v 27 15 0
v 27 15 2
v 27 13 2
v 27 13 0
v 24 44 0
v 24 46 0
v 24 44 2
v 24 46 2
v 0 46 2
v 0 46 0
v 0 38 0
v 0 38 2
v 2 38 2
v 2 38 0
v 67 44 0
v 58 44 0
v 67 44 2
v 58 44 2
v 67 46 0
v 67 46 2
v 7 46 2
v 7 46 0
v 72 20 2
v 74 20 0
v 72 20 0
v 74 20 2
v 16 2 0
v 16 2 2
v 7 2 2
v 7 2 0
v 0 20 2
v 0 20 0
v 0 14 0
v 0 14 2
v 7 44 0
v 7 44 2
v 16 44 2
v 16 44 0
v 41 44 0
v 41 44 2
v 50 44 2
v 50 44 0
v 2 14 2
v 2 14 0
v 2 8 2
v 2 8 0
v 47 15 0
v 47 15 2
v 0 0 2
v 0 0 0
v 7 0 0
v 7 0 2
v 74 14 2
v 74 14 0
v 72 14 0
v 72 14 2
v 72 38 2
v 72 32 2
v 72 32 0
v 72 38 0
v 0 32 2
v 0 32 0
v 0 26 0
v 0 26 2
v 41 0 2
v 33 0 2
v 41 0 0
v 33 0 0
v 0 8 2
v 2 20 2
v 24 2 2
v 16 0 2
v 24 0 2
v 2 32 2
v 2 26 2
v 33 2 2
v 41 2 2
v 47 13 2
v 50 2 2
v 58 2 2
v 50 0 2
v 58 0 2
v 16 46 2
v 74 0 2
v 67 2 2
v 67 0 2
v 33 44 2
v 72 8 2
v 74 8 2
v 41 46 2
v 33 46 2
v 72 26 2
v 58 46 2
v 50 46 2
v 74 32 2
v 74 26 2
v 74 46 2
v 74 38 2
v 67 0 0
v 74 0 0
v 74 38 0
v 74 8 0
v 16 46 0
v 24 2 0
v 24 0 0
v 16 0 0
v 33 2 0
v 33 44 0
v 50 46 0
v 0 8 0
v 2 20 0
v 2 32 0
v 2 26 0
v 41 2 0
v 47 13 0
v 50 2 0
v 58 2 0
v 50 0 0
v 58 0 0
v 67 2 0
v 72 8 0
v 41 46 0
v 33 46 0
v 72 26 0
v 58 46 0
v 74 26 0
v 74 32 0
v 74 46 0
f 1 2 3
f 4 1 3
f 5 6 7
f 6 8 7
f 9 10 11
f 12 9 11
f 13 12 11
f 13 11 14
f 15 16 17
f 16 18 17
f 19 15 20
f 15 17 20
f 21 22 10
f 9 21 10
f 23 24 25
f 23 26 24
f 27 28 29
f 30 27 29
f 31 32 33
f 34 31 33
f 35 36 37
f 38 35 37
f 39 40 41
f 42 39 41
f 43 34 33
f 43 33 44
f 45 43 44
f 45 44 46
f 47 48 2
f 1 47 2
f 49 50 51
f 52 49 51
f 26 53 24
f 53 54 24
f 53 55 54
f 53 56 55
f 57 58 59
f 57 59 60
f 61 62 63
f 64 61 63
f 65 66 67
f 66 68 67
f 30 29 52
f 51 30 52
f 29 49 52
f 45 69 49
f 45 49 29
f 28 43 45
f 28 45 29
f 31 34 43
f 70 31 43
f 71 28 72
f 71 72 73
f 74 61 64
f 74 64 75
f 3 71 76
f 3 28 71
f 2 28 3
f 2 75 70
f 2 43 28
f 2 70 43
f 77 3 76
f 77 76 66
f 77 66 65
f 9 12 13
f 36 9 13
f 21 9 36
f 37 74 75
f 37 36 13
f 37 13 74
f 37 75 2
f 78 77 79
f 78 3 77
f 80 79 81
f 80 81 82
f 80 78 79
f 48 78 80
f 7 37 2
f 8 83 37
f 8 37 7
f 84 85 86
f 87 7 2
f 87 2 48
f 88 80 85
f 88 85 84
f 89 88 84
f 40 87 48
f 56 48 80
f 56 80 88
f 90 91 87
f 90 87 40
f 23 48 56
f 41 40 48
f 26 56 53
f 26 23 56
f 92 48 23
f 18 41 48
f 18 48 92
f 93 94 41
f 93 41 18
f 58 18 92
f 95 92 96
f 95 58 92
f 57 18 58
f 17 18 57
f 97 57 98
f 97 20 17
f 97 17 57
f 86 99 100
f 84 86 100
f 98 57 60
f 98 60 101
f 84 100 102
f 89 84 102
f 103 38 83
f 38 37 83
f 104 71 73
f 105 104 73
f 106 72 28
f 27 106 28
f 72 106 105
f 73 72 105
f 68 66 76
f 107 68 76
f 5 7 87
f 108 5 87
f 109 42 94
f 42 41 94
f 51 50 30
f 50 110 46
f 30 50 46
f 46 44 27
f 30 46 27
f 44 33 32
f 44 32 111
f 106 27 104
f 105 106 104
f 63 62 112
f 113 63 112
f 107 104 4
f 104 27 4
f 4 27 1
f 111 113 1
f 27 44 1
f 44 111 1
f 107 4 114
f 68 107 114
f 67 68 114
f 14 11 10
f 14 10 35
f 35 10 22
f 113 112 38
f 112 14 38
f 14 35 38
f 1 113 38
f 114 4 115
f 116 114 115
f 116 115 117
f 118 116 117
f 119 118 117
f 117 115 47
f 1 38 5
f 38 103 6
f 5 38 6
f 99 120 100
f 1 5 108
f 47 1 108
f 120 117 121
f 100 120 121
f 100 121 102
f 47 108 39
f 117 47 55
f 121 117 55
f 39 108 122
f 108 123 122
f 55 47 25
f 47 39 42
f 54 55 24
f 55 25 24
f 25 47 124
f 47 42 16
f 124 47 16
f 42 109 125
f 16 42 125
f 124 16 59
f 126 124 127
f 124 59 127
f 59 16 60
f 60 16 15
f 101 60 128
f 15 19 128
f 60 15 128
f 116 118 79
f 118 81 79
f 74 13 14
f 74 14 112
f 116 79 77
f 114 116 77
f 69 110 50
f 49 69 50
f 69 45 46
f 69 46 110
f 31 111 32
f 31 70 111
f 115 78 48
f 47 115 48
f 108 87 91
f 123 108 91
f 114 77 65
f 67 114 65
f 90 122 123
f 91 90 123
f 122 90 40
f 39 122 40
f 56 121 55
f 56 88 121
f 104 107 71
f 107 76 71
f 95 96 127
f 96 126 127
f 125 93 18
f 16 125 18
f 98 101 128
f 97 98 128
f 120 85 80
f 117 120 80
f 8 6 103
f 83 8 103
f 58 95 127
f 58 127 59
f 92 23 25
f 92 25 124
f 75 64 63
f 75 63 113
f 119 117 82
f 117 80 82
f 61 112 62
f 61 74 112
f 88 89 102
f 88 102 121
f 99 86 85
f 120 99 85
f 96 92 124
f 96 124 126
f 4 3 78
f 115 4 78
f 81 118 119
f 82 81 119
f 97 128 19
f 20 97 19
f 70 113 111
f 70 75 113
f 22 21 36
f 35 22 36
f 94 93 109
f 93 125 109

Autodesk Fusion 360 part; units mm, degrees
sketch "スケッチ1" plane through (0, 0, 0) normal (0, 0, 1) x (1, 0, 0)
  line L0 (0, 0) -> (74, 0)
  line L1 (74, 0) -> (74, 46)
  line L2 (74, 46) -> (0, 46)
  line L3 (0, 46) -> (0, 0)
  dimension "d1" = 46
  dimension "d2" = 74
extrude "押し出し1" add sketch "スケッチ1" along normal blind 2
sketch "スケッチ2" plane through (0, 0, 2) normal (0, 0, 1) x (-1, 0, 0)
  line L0 (0, -46) -> (0, 0)
  line L1 (0, 0) -> (-74, 0)
  line L2 (-74, 0) -> (-74, -46)
  line L3 (-74, -46) -> (0, -46)
  line L4 (-27, -13) -> (-47, -13)
  line L5 (-47, -13) -> (-47, -15)
  line L6 (-47, -15) -> (-27, -15)
  line L7 (-27, -15) -> (-27, -13)
  dimension "d5" = 2
  dimension "d6" = 20
  dimension "d7" = 13
  dimension "d8" = 27
extrude "押し出し2" cut sketch "スケッチ2" against normal blind 2 contours L4 L5 L6 L7
sketch "スケッチ3" plane through (0, 0, 2) normal (0, 0, 1) x (-1, 0, 0)
  line L0 (-47, -13) -> (-27, -13)
  line L1 (-27, -13) -> (-27, -15)
  line L2 (-27, -15) -> (-47, -15)
  line L3 (-47, -15) -> (-47, -13)
  line L4 (0, -46) -> (0, 0)
  line L5 (0, 0) -> (-74, 0)
  line L6 (-74, 0) -> (-74, -46)
  line L7 (-74, -46) -> (0, -46)
  line L8 (-67, -46) -> (-58, -46)
  line L9 (-58, -46) -> (-58, -44)
  line L10 (-58, -44) -> (-67, -44)
  line L11 (-67, -44) -> (-67, -46)
  line L12 (-50, -46) -> (-41, -46)
  line L13 (-50, -44) -> (-50, -46)
  line L14 (-41, -44) -> (-50, -44)
  line L15 (-41, -46) -> (-41, -44)
  line L16 (-33, -46) -> (-24, -46)
  line L17 (-33, -44) -> (-33, -46)
  line L18 (-24, -44) -> (-33, -44)
  line L19 (-24, -46) -> (-24, -44)
  line L20 (-16, -46) -> (-7, -46)
  line L21 (-16, -44) -> (-16, -46)
  line L22 (-7, -44) -> (-16, -44)
  line L23 (-7, -46) -> (-7, -44)
  line L24 (-24, 0) -> (-33, 0)
  line L25 (-33, 0) -> (-33, -2)
  line L26 (-58, 0) -> (-67, 0)
  line L27 (-50, 0) -> (-50, -2)
  line L28 (-50, -2) -> (-41, -2)
  line L29 (-7, -2) -> (-7, 0)
  line L30 (-7, 0) -> (-16, 0)
  line L31 (-16, 0) -> (-16, -2)
  line L32 (-33, -2) -> (-24, -2)
  line L33 (-67, 0) -> (-67, -2)
  line L34 (-41, -2) -> (-41, 0)
  line L35 (-16, -2) -> (-7, -2)
  line L36 (-24, -2) -> (-24, 0)
  line L37 (-41, 0) -> (-50, 0)
  line L38 (-67, -2) -> (-58, -2)
  line L39 (-58, -2) -> (-58, 0)
  line L40 (0, -38) -> (-2, -38)
  line L41 (-2, -38) -> (-2, -32)
  line L42 (-2, -32) -> (0, -32)
  line L43 (0, -32) -> (0, -38)
  line L44 (-2, -20) -> (0, -20)
  line L45 (-2, -26) -> (-2, -20)
  line L46 (0, -26) -> (-2, -26)
  line L47 (0, -20) -> (0, -26)
  line L48 (-2, -8) -> (0, -8)
  line L49 (-2, -14) -> (-2, -8)
  line L50 (0, -14) -> (-2, -14)
  line L51 (0, -8) -> (0, -14)
  line L52 (-74, -20) -> (-72, -20)
  line L53 (-72, -8) -> (-72, -14)
  line L54 (-74, -8) -> (-72, -8)
  line L55 (-72, -14) -> (-74, -14)
  line L56 (-74, -38) -> (-74, -32)
  line L57 (-72, -32) -> (-72, -38)
  line L58 (-72, -26) -> (-74, -26)
  line L59 (-74, -32) -> (-72, -32)
  line L60 (-74, -14) -> (-74, -8)
  line L61 (-72, -20) -> (-72, -26)
  line L62 (-74, -26) -> (-74, -20)
  line L63 (-72, -38) -> (-74, -38)
  dimension "d11" = 9
  dimension "d12" = 2
  dimension "d13" = 7
  dimension "d16" = 17
  dimension "d17" = 0
  dimension "d20" = 0
  dimension "d21" = 44
  dimension "d22" = 6
  dimension "d23" = 2
  dimension "d24" = 8
  dimension "d27" = 0
  dimension "d28" = 12
  dimension "d31" = -72
  dimension "d32" = 0
extrude "押し出し3" cut sketch "スケッチ3" against normal blind 2 contours L4 L40 L41 L42 L43 | L7 L20 L21 L22 L23 | L4 L44 L45 L46 L47 | L7 L16 L17 L18 L19 | L4 L48 L49 L50 L51 | L7 L12 L13 L14 L15 | L7 L8 L9 L10 L11 | L5 L29 L30 L31 L35 | L5 L24 L25 L32 L36 | L6 L56 L57 L59 L63 | L5 L27 L28 L34 L37 | L6 L52 L58 L61 L62 | L5 L26 L33 L38 L39 | L6 L53 L54 L55 L60
